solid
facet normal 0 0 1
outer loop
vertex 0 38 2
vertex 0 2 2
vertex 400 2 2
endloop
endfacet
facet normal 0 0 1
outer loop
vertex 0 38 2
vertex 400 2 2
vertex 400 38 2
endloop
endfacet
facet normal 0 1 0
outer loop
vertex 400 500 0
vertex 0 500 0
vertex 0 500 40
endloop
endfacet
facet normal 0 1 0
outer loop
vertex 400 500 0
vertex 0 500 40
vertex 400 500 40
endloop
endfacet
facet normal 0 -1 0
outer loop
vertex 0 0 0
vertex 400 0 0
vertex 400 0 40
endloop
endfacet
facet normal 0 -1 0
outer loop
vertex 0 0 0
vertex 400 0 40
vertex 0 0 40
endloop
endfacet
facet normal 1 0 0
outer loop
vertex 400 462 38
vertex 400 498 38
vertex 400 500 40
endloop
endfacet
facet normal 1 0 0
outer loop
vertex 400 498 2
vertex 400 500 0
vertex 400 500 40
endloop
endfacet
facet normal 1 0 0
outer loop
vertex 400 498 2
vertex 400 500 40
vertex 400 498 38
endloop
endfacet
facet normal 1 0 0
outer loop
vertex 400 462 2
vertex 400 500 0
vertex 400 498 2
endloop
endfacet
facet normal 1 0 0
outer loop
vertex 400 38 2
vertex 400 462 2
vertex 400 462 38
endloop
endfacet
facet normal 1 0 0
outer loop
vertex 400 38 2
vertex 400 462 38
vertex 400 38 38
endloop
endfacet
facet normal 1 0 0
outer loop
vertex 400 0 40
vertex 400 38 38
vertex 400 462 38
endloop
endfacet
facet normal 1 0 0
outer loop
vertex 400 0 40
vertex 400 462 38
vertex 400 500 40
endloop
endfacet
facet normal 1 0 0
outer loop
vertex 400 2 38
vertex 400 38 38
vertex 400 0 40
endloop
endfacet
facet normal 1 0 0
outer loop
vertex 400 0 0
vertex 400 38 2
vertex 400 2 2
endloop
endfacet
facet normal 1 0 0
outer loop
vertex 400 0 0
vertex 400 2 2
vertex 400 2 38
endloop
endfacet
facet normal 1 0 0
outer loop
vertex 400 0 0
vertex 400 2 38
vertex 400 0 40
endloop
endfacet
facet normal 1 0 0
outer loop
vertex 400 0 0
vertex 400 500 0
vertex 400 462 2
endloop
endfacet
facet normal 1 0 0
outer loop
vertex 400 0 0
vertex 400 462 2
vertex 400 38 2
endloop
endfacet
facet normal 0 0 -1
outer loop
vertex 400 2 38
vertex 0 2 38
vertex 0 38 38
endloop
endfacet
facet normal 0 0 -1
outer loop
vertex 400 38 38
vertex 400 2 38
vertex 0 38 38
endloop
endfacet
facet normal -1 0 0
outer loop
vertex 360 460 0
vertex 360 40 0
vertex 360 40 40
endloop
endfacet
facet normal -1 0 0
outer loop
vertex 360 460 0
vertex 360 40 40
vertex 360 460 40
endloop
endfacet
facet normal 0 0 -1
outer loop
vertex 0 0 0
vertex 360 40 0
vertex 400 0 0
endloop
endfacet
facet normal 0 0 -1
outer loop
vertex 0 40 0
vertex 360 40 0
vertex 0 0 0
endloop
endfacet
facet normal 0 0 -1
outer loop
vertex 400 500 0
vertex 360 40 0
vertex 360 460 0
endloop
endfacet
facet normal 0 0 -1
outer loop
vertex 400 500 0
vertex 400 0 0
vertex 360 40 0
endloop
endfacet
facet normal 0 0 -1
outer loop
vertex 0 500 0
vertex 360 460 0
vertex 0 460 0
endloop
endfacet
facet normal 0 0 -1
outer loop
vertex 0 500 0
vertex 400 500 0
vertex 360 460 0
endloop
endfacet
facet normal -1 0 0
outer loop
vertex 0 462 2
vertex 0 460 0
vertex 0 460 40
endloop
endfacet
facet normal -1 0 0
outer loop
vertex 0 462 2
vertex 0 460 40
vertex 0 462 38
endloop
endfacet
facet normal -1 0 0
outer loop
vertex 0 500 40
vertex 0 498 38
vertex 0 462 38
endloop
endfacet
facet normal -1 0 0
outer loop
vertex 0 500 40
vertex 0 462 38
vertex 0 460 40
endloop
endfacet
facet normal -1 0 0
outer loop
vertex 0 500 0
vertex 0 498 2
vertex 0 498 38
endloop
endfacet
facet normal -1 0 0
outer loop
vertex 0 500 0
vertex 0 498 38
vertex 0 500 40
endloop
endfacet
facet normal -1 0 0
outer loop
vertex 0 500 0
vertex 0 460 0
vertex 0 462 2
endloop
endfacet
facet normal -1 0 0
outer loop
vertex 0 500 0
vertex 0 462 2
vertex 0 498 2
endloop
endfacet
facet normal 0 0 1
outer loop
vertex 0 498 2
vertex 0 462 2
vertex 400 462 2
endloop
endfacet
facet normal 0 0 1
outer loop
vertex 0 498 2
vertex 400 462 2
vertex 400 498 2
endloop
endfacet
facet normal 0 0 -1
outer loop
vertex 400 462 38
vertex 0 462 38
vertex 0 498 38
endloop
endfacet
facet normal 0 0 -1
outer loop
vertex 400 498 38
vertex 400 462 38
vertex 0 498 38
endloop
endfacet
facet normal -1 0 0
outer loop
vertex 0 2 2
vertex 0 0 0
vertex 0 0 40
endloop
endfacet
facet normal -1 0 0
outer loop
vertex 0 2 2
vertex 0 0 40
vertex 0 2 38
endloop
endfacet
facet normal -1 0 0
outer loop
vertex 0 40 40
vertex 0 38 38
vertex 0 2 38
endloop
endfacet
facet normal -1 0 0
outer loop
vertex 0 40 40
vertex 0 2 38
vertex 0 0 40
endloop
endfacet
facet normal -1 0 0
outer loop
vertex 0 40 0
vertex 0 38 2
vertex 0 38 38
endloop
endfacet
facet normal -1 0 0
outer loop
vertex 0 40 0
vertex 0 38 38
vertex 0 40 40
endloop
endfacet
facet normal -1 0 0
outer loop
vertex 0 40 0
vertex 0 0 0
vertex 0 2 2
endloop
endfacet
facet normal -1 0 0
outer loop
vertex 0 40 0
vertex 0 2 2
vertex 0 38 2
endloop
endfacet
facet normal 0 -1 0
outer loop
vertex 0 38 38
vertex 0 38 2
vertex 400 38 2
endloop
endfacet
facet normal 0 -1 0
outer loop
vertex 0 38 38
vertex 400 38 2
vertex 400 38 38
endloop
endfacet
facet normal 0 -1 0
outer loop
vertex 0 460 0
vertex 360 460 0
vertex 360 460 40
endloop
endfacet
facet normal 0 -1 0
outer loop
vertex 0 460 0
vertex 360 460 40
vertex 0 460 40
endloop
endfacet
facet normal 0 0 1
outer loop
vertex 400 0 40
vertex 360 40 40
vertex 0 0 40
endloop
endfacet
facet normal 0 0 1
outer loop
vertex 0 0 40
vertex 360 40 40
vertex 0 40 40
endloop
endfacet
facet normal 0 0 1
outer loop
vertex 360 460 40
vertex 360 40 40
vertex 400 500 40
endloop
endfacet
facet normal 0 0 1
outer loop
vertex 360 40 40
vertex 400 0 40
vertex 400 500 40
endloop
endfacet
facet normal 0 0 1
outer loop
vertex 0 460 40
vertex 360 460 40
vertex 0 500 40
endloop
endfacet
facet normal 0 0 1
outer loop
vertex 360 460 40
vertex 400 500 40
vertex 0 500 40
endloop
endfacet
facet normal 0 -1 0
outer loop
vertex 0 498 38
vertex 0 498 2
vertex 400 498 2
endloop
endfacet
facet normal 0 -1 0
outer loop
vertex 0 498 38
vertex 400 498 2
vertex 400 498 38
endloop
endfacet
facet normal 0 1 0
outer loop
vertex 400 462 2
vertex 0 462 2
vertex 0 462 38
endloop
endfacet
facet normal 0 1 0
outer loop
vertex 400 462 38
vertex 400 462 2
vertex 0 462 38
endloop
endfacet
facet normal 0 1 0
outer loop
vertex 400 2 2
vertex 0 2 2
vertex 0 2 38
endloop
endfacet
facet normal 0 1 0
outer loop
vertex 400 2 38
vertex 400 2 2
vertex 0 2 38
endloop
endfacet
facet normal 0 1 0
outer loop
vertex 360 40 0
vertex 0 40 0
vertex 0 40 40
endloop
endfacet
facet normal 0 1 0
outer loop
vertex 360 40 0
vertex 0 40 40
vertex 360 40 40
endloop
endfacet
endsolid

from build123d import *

# Parameters (mm, degrees)
BOSS_EXTRUDE1_DEPTH = 40
SKETCH3_W           = 36
SKETCH3_H           = 36
CUT_EXTRUDE1_DEPTH  = 448
SKETCH4_W           = 36
SKETCH4_H           = 36
CUT_EXTRUDE2_DEPTH  = 448


with BuildPart() as part:
    # Sketch2 → Boss-Extrude1 (new body)
    with BuildSketch(Plane.XY):
        Polygon((0, 0), (0, 40), (360, 40), (360, 460), (0, 460), (0, 500), (400, 500), (400, 0), align=None)
    extrude(amount=BOSS_EXTRUDE1_DEPTH)

    # Sketch3 → Cut-Extrude1 (cut)
    with BuildSketch(Plane.ZY):
        with Locations((20, 480)):
            Rectangle(SKETCH3_W, SKETCH3_H)
    extrude(amount=-CUT_EXTRUDE1_DEPTH, mode=Mode.SUBTRACT)

    # Sketch4 → Cut-Extrude2 (cut)
    with BuildSketch(Plane.ZY):
        with Locations((20, 20)):
            Rectangle(SKETCH4_W, SKETCH4_H)
    extrude(amount=-CUT_EXTRUDE2_DEPTH, mode=Mode.SUBTRACT)


solid = part.part
